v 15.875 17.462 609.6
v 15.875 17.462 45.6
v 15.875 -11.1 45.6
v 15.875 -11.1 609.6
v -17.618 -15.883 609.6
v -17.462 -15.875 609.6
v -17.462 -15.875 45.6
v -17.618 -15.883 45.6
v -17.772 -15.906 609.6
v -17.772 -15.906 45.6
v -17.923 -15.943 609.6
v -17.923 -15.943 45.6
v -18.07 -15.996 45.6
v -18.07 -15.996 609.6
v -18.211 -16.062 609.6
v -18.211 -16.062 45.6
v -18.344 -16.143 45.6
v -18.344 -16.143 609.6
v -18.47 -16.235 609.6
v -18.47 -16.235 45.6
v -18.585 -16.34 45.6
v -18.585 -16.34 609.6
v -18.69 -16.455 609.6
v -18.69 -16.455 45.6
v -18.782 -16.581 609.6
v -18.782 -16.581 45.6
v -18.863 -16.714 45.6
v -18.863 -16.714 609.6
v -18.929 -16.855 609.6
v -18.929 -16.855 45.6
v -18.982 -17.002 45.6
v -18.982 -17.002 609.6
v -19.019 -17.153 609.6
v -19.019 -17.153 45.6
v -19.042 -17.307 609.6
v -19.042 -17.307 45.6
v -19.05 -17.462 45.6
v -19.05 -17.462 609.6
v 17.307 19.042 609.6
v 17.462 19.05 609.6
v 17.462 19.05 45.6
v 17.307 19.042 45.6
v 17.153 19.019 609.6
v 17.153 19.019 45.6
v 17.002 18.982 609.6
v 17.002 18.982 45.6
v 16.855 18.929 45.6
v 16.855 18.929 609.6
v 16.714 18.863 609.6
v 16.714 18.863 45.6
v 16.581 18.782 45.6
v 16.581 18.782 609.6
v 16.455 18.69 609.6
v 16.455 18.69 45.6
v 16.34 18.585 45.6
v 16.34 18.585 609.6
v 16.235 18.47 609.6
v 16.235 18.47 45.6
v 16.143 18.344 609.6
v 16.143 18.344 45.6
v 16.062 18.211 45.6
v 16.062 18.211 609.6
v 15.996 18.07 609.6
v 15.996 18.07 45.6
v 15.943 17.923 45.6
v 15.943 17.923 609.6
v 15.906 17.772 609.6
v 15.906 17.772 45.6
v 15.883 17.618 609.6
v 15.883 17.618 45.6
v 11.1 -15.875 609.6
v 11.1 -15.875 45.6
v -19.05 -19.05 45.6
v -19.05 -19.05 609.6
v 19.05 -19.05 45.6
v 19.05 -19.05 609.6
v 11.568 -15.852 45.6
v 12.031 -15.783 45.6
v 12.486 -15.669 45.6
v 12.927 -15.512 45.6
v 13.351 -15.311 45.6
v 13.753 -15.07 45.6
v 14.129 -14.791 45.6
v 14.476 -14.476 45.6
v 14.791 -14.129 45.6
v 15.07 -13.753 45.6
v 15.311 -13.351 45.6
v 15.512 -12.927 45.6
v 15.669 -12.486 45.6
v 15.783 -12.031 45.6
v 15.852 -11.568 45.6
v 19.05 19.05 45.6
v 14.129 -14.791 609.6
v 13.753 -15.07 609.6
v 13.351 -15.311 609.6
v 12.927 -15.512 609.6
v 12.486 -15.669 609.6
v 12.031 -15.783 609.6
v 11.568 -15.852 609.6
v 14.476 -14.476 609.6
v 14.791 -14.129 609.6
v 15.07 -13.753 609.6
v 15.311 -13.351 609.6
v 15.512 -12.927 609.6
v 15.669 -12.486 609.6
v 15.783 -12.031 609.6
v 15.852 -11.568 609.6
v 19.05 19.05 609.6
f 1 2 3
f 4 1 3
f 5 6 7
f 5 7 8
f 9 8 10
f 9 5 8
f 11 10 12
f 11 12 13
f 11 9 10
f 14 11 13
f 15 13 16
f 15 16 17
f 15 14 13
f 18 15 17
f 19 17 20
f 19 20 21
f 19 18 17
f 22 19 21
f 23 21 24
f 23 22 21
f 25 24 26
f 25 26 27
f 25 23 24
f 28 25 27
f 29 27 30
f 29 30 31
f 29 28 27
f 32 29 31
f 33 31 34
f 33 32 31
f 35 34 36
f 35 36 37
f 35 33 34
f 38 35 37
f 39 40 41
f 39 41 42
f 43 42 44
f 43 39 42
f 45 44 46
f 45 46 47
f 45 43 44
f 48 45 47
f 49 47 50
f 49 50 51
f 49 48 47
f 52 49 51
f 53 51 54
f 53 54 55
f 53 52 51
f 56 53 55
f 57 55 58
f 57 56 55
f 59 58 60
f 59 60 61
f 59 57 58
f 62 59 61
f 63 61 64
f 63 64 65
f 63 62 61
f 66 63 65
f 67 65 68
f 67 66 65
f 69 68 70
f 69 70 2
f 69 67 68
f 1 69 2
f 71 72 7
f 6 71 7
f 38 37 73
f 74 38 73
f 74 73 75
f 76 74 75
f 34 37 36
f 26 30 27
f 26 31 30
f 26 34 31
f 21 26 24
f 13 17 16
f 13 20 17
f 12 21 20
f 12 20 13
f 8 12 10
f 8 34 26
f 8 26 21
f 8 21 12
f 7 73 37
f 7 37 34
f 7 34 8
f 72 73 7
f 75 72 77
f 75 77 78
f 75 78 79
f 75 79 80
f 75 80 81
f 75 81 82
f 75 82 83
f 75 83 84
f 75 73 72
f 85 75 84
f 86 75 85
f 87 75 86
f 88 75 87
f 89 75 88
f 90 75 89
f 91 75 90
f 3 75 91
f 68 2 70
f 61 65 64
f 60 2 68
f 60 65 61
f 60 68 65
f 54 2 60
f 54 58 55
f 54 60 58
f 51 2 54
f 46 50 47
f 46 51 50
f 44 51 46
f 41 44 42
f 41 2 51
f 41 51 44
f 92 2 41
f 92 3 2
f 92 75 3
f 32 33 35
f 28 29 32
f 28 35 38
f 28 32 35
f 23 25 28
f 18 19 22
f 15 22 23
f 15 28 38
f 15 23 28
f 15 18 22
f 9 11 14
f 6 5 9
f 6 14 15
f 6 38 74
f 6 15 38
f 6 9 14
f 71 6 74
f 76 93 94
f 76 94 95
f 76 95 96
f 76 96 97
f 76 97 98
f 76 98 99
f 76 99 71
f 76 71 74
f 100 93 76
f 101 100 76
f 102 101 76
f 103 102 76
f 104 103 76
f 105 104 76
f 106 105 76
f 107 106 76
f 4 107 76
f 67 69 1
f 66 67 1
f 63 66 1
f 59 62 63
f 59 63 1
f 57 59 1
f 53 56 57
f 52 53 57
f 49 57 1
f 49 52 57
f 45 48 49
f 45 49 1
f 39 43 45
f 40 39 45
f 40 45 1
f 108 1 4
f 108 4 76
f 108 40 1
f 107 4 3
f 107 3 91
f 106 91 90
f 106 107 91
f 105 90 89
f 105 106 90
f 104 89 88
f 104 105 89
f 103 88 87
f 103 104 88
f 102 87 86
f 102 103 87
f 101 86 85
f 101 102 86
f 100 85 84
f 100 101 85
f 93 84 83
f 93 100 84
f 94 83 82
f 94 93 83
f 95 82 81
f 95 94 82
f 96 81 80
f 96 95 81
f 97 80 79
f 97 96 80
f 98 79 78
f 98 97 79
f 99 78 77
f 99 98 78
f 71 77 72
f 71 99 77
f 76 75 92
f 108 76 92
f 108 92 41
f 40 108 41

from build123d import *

# Parameters (mm, degrees)
BOSS_EXTRUDE1_DEPTH = 609.6
SKETCH3_W           = 635.2
SKETCH3_H           = 38.1
CUT_EXTRUDE1_DEPTH  = 60
SKETCH4_W           = 20
SKETCH4_H           = 38.1
CUT_EXTRUDE2_DEPTH  = 60


with BuildPart() as part:
    # Sketch2 → Boss-Extrude1 (new, symmetric)
    with BuildSketch(Plane.XY):
        with BuildLine():
            Line((-19.05, -19.05), (19.05, -19.05))
            Line((19.05, -19.05), (19.05, 19.05))
            Line((19.05, 19.05), (17.4625, 19.05))
            ThreePointArc((17.4625, 19.05), (16.339967985, 18.585032015), (15.875, 17.4625))
            Line((15.875, 17.4625), (15.875, -11.0998))
            ThreePointArc((15.875, -11.0998), (14.476376302, -14.476376302), (11.0998, -15.875))
            Line((11.0998, -15.875), (-17.4625, -15.875))
            ThreePointArc((-17.4625, -15.875), (-18.585032015, -16.339967985), (-19.05, -17.4625))
            Line((-19.05, -17.4625), (-19.05, -19.05))
        make_face()
    extrude(amount=BOSS_EXTRUDE1_DEPTH, both=True)

    # Sketch3 → Cut-Extrude1 (cut)
    with BuildSketch(Plane(origin=(19.05, 0, 0), x_dir=(0, 0, -1), z_dir=(1, 0, 0))):
        with Locations((292, 0)):
            Rectangle(SKETCH3_W, SKETCH3_H)
    extrude(amount=-CUT_EXTRUDE1_DEPTH, mode=Mode.SUBTRACT)

    # Sketch4 → Cut-Extrude2 (cut)
    with BuildSketch(Plane(origin=(19.05, 0, 0), x_dir=(0, 0, -1), z_dir=(1, 0, 0))):
        with Locations((-35.6, 0)):
            Rectangle(SKETCH4_W, SKETCH4_H)
    extrude(amount=-CUT_EXTRUDE2_DEPTH, mode=Mode.SUBTRACT)


solid = part.part
